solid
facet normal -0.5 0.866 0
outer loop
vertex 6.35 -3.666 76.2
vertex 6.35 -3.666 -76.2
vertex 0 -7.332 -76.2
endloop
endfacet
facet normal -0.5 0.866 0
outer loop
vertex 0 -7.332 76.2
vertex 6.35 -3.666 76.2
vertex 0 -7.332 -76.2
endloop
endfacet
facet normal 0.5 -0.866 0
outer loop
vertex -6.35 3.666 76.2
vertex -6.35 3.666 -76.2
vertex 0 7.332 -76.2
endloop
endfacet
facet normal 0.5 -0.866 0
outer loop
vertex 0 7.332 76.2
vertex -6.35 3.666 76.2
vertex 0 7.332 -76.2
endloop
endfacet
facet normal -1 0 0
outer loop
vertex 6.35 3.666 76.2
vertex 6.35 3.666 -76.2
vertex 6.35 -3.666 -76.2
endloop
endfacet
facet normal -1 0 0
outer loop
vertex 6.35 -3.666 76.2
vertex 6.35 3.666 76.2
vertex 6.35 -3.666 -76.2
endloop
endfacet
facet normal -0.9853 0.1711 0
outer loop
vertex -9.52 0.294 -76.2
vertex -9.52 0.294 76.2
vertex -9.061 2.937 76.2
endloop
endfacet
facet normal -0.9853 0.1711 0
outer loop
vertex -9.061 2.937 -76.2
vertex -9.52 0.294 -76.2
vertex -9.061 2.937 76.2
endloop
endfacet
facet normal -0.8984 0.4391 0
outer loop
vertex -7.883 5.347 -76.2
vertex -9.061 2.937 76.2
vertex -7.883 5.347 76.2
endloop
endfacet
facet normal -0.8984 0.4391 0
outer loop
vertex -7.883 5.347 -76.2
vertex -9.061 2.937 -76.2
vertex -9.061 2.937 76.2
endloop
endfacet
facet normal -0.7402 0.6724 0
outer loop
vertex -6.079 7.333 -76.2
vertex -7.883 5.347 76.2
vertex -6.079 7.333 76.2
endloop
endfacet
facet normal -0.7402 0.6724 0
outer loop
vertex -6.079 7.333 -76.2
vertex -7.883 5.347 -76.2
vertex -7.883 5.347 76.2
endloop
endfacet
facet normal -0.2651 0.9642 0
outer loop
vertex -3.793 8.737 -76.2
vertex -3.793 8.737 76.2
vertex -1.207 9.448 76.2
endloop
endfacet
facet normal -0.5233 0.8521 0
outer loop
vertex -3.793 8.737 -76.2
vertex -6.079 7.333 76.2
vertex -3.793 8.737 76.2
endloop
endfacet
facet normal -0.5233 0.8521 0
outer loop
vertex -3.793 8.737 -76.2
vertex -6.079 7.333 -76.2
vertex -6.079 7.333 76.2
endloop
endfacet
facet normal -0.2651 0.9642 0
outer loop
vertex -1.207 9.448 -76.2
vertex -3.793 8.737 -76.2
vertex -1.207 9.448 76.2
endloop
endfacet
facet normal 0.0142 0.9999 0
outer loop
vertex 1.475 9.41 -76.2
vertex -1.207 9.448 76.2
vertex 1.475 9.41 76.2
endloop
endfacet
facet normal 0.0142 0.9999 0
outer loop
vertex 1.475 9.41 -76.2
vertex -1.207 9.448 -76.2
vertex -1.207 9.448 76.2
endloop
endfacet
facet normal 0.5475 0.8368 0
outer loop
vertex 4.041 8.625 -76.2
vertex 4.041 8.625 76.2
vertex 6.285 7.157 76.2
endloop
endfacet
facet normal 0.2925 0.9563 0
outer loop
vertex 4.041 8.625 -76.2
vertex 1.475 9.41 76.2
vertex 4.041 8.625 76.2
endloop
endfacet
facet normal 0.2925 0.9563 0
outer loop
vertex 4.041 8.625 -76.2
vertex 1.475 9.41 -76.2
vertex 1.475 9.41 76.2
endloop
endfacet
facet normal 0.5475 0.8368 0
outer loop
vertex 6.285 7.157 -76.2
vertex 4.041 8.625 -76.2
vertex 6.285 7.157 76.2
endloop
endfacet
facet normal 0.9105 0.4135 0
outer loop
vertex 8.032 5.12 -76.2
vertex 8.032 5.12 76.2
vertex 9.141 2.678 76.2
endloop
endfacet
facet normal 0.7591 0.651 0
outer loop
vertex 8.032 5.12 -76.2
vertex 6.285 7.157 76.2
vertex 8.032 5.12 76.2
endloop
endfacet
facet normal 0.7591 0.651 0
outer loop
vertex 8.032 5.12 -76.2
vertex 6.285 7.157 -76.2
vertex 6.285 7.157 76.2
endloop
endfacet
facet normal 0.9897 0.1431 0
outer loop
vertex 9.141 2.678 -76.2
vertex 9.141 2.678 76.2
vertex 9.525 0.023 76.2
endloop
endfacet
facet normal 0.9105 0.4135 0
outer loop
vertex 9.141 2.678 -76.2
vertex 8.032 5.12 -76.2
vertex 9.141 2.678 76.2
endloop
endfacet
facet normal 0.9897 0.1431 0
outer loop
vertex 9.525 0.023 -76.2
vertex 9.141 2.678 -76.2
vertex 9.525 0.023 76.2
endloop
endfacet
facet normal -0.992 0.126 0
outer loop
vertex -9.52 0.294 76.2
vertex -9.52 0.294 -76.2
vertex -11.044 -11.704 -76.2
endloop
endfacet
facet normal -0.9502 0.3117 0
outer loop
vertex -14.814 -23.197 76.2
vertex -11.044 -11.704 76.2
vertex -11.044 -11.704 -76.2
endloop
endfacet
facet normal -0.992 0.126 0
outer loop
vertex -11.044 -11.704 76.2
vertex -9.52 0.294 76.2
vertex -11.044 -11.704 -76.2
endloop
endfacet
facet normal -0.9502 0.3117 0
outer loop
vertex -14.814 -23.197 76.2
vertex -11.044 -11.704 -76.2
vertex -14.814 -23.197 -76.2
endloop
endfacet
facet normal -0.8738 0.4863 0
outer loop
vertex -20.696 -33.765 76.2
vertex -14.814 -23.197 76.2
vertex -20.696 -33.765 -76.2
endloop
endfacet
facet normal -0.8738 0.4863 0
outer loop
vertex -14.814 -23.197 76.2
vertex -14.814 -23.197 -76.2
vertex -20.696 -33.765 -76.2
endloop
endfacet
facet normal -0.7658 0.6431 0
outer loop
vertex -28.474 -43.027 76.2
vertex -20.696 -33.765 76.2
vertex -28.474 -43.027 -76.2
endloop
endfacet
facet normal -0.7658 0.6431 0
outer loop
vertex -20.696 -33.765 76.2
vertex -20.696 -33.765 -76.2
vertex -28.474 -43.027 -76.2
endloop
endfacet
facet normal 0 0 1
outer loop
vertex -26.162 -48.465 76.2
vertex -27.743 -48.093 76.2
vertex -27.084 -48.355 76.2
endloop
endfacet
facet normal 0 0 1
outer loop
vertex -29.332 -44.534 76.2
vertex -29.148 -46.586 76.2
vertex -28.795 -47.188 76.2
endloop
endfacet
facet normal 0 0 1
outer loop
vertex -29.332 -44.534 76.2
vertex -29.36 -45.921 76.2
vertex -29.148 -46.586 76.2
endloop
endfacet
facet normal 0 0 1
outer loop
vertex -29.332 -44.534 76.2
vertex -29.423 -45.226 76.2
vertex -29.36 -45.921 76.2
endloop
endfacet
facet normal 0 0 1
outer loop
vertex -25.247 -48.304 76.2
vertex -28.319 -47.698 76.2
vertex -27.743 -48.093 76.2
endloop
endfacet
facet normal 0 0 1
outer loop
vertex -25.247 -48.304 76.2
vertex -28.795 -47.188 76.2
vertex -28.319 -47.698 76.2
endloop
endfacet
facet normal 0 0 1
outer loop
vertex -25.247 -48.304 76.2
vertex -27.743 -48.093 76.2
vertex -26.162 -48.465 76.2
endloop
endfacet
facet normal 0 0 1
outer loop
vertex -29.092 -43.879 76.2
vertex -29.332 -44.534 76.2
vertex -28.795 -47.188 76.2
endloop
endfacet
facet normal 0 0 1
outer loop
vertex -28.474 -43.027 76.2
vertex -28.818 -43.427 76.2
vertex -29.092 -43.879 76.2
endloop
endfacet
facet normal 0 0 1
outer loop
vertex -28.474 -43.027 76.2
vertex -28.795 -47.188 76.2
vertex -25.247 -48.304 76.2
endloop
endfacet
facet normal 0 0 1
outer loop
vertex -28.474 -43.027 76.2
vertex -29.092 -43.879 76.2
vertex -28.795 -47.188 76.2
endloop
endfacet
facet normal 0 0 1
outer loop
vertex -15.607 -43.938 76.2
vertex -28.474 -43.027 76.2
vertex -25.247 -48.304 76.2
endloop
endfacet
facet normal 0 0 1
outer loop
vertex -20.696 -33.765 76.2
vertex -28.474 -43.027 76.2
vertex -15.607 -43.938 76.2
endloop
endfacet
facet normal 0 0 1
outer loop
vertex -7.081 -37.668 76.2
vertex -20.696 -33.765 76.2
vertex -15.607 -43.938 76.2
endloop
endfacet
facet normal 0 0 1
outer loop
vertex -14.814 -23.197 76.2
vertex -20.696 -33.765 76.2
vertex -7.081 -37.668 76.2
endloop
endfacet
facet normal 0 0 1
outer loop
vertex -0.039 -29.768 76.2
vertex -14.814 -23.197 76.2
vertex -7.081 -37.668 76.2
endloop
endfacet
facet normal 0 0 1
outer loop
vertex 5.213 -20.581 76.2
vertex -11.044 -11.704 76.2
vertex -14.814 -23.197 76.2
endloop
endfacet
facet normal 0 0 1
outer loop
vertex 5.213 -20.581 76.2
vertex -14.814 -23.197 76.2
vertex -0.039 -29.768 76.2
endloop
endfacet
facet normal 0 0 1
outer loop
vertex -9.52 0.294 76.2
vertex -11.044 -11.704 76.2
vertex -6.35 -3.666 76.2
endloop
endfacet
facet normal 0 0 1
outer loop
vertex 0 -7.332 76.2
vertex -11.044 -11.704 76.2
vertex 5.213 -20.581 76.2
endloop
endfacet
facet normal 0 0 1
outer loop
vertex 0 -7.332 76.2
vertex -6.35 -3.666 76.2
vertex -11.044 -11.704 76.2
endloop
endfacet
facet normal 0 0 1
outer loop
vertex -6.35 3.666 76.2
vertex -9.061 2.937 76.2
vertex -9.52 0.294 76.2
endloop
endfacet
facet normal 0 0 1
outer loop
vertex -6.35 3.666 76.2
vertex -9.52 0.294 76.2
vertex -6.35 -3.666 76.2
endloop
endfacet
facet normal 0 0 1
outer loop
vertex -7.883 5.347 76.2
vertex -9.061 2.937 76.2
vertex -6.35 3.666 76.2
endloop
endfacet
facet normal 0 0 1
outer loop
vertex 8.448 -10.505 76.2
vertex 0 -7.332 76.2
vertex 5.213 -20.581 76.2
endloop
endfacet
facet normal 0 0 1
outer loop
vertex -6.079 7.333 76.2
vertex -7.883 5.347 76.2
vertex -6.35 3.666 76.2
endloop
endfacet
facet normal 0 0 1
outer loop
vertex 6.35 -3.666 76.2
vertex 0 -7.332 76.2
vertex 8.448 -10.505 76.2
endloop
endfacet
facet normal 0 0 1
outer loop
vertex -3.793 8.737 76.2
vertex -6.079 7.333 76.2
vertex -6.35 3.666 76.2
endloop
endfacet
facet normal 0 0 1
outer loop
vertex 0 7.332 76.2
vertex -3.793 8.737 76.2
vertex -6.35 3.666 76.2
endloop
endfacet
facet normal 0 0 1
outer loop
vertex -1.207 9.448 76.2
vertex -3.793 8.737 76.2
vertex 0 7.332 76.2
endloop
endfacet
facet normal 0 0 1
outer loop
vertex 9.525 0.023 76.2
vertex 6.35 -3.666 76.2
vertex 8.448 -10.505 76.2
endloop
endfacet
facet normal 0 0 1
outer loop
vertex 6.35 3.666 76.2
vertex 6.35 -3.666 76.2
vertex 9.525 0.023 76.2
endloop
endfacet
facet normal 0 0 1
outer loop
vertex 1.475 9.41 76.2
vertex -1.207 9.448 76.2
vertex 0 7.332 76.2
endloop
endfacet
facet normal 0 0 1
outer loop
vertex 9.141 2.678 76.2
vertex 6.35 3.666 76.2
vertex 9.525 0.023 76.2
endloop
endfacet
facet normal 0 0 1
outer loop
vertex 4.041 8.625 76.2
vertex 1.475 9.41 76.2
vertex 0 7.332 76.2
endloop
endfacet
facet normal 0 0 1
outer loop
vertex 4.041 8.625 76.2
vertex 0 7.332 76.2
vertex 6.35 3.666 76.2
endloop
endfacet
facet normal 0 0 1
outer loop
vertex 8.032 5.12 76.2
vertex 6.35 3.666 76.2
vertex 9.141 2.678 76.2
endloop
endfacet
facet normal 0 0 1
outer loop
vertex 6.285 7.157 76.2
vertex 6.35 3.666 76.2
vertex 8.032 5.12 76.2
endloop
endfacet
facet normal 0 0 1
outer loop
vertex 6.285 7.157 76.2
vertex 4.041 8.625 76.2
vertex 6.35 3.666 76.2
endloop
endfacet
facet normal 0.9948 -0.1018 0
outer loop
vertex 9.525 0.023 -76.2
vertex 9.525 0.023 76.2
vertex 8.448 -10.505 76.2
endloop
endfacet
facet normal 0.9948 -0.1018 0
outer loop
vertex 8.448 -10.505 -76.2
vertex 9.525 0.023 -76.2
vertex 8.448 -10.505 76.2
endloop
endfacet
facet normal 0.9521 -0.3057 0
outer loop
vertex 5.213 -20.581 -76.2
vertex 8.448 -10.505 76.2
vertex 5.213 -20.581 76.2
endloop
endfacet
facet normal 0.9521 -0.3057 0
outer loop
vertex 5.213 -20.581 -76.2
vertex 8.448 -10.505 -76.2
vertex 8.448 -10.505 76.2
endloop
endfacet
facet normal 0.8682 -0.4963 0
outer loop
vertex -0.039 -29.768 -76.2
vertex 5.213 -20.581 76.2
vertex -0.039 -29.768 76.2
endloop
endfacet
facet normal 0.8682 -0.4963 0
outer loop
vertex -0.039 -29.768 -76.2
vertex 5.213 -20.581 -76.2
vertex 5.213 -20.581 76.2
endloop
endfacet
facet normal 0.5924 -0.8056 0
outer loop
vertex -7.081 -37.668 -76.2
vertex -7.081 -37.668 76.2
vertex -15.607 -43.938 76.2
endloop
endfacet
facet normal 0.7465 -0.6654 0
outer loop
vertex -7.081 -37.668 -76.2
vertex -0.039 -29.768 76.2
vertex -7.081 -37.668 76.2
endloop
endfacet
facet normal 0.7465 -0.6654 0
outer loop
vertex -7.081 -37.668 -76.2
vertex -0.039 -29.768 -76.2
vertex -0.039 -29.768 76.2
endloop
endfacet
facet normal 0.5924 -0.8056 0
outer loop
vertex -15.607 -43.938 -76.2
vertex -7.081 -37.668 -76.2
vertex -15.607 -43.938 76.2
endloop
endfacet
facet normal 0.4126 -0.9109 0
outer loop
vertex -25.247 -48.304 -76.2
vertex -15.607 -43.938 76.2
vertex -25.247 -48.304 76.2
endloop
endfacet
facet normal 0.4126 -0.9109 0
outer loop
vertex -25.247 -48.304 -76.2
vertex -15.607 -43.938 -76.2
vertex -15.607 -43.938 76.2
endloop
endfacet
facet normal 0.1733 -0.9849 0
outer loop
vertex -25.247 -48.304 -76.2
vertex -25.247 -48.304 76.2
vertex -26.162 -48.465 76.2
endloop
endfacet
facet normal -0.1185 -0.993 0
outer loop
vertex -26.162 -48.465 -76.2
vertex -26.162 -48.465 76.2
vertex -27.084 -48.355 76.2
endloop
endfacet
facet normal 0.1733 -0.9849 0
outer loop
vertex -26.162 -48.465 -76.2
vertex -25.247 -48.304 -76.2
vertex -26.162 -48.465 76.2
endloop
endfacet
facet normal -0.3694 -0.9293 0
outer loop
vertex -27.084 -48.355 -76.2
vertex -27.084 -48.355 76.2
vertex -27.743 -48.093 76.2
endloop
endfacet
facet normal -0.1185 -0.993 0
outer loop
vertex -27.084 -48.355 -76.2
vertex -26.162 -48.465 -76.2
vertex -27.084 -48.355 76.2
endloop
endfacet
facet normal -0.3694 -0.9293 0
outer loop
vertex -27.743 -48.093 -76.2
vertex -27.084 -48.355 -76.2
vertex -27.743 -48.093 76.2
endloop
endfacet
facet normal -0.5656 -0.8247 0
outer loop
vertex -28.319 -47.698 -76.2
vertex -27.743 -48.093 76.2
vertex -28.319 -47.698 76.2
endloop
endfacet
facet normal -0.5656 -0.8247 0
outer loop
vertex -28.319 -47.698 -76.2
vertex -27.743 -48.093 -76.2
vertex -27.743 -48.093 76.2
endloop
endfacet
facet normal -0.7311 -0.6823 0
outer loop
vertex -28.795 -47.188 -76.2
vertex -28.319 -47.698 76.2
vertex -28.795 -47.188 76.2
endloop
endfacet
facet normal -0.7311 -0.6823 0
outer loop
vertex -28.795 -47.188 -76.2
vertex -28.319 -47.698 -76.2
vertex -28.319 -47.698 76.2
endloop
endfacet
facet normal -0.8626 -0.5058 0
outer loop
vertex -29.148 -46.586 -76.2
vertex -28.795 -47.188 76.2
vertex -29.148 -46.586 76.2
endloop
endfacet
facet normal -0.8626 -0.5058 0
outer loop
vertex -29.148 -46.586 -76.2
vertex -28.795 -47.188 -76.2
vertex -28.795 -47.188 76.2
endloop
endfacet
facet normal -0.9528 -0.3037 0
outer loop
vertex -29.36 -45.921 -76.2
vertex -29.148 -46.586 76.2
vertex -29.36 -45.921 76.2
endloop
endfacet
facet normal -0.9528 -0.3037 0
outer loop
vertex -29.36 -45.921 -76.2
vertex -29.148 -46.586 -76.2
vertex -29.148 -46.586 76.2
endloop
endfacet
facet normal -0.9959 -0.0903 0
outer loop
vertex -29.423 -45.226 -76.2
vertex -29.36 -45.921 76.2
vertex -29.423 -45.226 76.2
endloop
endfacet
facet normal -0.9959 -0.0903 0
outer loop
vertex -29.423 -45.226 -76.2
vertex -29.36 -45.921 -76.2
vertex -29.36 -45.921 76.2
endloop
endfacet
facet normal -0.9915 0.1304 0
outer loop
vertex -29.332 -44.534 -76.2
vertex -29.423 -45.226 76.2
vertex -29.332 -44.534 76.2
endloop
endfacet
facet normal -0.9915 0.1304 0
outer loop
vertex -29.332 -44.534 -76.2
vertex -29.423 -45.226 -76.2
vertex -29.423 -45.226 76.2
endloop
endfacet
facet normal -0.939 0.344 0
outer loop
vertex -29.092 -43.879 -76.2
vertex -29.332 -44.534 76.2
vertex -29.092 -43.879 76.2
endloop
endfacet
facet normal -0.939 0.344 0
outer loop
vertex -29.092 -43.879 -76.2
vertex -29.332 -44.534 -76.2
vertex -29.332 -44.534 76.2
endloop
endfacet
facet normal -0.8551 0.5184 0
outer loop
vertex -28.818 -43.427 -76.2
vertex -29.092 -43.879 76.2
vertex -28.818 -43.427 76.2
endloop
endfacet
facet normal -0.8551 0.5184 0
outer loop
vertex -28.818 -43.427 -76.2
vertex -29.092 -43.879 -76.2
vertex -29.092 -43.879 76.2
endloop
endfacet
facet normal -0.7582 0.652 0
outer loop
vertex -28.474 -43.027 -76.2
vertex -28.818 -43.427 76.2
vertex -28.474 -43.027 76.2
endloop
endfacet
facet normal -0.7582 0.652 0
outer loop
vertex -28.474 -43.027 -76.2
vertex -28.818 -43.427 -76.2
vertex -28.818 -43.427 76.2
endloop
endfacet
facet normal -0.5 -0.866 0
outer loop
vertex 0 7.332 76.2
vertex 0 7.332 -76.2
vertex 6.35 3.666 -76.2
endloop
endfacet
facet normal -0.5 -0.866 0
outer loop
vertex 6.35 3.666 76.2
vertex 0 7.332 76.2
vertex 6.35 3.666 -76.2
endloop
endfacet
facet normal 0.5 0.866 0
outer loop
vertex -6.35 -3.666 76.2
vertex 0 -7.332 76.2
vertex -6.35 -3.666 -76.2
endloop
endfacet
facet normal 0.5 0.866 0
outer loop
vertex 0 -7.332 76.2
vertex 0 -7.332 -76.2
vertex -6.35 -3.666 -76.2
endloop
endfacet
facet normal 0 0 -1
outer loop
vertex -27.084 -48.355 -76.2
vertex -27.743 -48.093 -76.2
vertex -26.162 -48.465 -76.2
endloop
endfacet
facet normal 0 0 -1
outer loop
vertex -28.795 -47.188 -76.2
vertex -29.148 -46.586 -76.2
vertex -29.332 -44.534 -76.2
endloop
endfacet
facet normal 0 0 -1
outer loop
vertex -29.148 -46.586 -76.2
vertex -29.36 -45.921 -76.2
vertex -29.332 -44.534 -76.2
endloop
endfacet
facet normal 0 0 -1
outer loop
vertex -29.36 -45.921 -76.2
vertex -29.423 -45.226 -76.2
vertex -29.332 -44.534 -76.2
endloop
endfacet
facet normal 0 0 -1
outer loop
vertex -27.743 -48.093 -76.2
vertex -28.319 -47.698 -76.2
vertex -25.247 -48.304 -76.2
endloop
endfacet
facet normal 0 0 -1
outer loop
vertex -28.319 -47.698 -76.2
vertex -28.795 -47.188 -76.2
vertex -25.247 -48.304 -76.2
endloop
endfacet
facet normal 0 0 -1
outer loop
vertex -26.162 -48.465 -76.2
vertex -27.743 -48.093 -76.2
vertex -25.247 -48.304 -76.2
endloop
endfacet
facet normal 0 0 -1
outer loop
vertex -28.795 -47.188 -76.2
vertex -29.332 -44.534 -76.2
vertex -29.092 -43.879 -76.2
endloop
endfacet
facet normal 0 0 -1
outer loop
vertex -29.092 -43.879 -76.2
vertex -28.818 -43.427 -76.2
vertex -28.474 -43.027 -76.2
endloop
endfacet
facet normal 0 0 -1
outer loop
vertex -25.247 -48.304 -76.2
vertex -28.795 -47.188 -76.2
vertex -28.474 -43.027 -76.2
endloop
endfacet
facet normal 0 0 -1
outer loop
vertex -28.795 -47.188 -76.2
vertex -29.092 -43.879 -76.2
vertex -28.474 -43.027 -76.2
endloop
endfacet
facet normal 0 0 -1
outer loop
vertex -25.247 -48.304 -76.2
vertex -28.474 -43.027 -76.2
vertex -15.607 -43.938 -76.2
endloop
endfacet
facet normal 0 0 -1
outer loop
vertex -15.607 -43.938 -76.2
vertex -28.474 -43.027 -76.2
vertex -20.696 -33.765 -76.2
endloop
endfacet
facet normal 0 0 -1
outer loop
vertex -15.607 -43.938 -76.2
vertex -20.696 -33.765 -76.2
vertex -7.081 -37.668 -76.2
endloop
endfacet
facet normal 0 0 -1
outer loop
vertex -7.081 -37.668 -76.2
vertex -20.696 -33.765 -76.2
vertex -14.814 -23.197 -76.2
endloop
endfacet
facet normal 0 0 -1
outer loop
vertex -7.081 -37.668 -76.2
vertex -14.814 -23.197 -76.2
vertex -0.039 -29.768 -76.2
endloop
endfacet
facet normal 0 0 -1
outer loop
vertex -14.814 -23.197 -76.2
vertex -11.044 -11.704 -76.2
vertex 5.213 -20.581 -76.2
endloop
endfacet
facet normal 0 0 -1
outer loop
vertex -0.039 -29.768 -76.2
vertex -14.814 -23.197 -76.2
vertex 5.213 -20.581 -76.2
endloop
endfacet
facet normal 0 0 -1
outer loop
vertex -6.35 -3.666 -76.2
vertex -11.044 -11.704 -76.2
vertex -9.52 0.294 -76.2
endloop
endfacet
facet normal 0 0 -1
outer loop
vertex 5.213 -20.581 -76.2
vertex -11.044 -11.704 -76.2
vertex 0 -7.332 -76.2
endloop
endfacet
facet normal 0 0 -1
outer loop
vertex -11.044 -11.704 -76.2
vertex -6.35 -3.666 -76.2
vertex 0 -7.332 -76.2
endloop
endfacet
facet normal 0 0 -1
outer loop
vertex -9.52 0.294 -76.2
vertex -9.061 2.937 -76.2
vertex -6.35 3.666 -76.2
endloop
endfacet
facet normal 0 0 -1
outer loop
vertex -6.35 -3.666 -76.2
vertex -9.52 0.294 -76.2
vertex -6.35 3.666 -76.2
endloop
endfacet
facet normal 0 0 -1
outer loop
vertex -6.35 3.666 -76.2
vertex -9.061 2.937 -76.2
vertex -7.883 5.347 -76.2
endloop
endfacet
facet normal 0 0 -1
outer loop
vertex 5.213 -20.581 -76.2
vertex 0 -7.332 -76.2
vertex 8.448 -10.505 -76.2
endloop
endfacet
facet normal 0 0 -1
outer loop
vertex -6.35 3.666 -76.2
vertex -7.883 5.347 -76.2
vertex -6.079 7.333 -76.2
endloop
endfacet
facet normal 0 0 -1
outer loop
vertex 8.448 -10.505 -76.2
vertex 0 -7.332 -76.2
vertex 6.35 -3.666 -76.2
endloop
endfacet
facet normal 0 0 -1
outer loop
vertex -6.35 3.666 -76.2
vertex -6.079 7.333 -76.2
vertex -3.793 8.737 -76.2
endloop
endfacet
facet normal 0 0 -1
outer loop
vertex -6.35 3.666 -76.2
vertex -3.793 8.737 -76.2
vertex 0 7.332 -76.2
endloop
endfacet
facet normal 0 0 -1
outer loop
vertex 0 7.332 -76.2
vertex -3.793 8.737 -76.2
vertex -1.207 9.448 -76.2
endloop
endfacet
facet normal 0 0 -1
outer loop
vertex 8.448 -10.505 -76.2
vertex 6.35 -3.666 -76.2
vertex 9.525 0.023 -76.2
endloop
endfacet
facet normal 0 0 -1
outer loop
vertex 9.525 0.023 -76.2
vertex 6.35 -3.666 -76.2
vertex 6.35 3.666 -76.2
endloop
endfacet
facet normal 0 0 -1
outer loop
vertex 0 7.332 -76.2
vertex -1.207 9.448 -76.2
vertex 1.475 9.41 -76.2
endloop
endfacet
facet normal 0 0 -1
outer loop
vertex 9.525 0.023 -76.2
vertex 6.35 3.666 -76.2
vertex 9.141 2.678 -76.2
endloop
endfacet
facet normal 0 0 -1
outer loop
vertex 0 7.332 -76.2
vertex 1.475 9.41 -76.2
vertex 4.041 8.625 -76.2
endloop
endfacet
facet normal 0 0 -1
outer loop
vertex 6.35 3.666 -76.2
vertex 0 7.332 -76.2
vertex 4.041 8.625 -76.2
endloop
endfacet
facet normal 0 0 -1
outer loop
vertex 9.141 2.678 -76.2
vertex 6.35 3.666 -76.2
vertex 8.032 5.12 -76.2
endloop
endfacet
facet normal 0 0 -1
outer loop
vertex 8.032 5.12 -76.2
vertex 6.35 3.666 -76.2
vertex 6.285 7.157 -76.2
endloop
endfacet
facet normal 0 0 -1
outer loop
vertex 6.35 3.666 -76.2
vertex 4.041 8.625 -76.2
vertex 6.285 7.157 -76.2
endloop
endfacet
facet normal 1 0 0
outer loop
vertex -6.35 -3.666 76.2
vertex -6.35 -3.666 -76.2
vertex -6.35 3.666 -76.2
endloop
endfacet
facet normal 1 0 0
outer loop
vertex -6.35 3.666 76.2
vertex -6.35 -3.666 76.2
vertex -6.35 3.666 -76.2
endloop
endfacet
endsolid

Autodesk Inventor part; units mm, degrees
ref_plane "YZ Plane" through (0, 0, 0) normal (1, 0, 0) x (0, 1, 0)
ref_plane "XZ Plane" through (0, 0, 0) normal (0, 1, 0) x (-1, 0, 0)
ref_plane "XY Plane" through (0, 0, 0) normal (0, 0, 1) x (1, 0, 0)
sketch "Sketch1" plane through (0, 0, 0) normal (0, 0, 1) x (1, 0, 0)
  line L0 (-6.35, 3.6662) -> (0, 7.3323)
  line L1 (0, 7.3323) -> (6.35, 3.6662)
  line L2 (6.35, 3.6662) -> (6.35, -3.6662)
  line L3 (6.35, -3.6662) -> (0, -7.3323)
  line L4 (0, -7.3323) -> (-6.35, -3.6662)
  line L5 (-6.35, -3.6662) -> (-6.35, 3.6662)
  arc A0 (9.525, 0.0229) -> (-9.5205, 0.2942) centre (0, 0) ccw
  arc A1 (-38.1, -50.8) -> (-9.5205, 0.2942) centre (-72.9901, 2.2559) ccw
  arc A2 (-38.1, -50.8) -> (9.525, 0.0229) centre (-41.2749, -0.0993) ccw
  dimension "d0" = 12.7
  dimension "d1" = 38.1
  dimension "d2" = 19.05
  dimension "d3" = 50.8
  dimension "d4" = 63.5
  dimension "d5" = 50.8
extrude "Extrusion1" add sketch "Sketch1" along normal mid plane 152.4
fillet "Fillet1" radius 3.175 1 edges at (-38.1, -50.8, 0)
properties part number "PLATE,TEARDROP,DROPBAR" material "ABS Plastic"
